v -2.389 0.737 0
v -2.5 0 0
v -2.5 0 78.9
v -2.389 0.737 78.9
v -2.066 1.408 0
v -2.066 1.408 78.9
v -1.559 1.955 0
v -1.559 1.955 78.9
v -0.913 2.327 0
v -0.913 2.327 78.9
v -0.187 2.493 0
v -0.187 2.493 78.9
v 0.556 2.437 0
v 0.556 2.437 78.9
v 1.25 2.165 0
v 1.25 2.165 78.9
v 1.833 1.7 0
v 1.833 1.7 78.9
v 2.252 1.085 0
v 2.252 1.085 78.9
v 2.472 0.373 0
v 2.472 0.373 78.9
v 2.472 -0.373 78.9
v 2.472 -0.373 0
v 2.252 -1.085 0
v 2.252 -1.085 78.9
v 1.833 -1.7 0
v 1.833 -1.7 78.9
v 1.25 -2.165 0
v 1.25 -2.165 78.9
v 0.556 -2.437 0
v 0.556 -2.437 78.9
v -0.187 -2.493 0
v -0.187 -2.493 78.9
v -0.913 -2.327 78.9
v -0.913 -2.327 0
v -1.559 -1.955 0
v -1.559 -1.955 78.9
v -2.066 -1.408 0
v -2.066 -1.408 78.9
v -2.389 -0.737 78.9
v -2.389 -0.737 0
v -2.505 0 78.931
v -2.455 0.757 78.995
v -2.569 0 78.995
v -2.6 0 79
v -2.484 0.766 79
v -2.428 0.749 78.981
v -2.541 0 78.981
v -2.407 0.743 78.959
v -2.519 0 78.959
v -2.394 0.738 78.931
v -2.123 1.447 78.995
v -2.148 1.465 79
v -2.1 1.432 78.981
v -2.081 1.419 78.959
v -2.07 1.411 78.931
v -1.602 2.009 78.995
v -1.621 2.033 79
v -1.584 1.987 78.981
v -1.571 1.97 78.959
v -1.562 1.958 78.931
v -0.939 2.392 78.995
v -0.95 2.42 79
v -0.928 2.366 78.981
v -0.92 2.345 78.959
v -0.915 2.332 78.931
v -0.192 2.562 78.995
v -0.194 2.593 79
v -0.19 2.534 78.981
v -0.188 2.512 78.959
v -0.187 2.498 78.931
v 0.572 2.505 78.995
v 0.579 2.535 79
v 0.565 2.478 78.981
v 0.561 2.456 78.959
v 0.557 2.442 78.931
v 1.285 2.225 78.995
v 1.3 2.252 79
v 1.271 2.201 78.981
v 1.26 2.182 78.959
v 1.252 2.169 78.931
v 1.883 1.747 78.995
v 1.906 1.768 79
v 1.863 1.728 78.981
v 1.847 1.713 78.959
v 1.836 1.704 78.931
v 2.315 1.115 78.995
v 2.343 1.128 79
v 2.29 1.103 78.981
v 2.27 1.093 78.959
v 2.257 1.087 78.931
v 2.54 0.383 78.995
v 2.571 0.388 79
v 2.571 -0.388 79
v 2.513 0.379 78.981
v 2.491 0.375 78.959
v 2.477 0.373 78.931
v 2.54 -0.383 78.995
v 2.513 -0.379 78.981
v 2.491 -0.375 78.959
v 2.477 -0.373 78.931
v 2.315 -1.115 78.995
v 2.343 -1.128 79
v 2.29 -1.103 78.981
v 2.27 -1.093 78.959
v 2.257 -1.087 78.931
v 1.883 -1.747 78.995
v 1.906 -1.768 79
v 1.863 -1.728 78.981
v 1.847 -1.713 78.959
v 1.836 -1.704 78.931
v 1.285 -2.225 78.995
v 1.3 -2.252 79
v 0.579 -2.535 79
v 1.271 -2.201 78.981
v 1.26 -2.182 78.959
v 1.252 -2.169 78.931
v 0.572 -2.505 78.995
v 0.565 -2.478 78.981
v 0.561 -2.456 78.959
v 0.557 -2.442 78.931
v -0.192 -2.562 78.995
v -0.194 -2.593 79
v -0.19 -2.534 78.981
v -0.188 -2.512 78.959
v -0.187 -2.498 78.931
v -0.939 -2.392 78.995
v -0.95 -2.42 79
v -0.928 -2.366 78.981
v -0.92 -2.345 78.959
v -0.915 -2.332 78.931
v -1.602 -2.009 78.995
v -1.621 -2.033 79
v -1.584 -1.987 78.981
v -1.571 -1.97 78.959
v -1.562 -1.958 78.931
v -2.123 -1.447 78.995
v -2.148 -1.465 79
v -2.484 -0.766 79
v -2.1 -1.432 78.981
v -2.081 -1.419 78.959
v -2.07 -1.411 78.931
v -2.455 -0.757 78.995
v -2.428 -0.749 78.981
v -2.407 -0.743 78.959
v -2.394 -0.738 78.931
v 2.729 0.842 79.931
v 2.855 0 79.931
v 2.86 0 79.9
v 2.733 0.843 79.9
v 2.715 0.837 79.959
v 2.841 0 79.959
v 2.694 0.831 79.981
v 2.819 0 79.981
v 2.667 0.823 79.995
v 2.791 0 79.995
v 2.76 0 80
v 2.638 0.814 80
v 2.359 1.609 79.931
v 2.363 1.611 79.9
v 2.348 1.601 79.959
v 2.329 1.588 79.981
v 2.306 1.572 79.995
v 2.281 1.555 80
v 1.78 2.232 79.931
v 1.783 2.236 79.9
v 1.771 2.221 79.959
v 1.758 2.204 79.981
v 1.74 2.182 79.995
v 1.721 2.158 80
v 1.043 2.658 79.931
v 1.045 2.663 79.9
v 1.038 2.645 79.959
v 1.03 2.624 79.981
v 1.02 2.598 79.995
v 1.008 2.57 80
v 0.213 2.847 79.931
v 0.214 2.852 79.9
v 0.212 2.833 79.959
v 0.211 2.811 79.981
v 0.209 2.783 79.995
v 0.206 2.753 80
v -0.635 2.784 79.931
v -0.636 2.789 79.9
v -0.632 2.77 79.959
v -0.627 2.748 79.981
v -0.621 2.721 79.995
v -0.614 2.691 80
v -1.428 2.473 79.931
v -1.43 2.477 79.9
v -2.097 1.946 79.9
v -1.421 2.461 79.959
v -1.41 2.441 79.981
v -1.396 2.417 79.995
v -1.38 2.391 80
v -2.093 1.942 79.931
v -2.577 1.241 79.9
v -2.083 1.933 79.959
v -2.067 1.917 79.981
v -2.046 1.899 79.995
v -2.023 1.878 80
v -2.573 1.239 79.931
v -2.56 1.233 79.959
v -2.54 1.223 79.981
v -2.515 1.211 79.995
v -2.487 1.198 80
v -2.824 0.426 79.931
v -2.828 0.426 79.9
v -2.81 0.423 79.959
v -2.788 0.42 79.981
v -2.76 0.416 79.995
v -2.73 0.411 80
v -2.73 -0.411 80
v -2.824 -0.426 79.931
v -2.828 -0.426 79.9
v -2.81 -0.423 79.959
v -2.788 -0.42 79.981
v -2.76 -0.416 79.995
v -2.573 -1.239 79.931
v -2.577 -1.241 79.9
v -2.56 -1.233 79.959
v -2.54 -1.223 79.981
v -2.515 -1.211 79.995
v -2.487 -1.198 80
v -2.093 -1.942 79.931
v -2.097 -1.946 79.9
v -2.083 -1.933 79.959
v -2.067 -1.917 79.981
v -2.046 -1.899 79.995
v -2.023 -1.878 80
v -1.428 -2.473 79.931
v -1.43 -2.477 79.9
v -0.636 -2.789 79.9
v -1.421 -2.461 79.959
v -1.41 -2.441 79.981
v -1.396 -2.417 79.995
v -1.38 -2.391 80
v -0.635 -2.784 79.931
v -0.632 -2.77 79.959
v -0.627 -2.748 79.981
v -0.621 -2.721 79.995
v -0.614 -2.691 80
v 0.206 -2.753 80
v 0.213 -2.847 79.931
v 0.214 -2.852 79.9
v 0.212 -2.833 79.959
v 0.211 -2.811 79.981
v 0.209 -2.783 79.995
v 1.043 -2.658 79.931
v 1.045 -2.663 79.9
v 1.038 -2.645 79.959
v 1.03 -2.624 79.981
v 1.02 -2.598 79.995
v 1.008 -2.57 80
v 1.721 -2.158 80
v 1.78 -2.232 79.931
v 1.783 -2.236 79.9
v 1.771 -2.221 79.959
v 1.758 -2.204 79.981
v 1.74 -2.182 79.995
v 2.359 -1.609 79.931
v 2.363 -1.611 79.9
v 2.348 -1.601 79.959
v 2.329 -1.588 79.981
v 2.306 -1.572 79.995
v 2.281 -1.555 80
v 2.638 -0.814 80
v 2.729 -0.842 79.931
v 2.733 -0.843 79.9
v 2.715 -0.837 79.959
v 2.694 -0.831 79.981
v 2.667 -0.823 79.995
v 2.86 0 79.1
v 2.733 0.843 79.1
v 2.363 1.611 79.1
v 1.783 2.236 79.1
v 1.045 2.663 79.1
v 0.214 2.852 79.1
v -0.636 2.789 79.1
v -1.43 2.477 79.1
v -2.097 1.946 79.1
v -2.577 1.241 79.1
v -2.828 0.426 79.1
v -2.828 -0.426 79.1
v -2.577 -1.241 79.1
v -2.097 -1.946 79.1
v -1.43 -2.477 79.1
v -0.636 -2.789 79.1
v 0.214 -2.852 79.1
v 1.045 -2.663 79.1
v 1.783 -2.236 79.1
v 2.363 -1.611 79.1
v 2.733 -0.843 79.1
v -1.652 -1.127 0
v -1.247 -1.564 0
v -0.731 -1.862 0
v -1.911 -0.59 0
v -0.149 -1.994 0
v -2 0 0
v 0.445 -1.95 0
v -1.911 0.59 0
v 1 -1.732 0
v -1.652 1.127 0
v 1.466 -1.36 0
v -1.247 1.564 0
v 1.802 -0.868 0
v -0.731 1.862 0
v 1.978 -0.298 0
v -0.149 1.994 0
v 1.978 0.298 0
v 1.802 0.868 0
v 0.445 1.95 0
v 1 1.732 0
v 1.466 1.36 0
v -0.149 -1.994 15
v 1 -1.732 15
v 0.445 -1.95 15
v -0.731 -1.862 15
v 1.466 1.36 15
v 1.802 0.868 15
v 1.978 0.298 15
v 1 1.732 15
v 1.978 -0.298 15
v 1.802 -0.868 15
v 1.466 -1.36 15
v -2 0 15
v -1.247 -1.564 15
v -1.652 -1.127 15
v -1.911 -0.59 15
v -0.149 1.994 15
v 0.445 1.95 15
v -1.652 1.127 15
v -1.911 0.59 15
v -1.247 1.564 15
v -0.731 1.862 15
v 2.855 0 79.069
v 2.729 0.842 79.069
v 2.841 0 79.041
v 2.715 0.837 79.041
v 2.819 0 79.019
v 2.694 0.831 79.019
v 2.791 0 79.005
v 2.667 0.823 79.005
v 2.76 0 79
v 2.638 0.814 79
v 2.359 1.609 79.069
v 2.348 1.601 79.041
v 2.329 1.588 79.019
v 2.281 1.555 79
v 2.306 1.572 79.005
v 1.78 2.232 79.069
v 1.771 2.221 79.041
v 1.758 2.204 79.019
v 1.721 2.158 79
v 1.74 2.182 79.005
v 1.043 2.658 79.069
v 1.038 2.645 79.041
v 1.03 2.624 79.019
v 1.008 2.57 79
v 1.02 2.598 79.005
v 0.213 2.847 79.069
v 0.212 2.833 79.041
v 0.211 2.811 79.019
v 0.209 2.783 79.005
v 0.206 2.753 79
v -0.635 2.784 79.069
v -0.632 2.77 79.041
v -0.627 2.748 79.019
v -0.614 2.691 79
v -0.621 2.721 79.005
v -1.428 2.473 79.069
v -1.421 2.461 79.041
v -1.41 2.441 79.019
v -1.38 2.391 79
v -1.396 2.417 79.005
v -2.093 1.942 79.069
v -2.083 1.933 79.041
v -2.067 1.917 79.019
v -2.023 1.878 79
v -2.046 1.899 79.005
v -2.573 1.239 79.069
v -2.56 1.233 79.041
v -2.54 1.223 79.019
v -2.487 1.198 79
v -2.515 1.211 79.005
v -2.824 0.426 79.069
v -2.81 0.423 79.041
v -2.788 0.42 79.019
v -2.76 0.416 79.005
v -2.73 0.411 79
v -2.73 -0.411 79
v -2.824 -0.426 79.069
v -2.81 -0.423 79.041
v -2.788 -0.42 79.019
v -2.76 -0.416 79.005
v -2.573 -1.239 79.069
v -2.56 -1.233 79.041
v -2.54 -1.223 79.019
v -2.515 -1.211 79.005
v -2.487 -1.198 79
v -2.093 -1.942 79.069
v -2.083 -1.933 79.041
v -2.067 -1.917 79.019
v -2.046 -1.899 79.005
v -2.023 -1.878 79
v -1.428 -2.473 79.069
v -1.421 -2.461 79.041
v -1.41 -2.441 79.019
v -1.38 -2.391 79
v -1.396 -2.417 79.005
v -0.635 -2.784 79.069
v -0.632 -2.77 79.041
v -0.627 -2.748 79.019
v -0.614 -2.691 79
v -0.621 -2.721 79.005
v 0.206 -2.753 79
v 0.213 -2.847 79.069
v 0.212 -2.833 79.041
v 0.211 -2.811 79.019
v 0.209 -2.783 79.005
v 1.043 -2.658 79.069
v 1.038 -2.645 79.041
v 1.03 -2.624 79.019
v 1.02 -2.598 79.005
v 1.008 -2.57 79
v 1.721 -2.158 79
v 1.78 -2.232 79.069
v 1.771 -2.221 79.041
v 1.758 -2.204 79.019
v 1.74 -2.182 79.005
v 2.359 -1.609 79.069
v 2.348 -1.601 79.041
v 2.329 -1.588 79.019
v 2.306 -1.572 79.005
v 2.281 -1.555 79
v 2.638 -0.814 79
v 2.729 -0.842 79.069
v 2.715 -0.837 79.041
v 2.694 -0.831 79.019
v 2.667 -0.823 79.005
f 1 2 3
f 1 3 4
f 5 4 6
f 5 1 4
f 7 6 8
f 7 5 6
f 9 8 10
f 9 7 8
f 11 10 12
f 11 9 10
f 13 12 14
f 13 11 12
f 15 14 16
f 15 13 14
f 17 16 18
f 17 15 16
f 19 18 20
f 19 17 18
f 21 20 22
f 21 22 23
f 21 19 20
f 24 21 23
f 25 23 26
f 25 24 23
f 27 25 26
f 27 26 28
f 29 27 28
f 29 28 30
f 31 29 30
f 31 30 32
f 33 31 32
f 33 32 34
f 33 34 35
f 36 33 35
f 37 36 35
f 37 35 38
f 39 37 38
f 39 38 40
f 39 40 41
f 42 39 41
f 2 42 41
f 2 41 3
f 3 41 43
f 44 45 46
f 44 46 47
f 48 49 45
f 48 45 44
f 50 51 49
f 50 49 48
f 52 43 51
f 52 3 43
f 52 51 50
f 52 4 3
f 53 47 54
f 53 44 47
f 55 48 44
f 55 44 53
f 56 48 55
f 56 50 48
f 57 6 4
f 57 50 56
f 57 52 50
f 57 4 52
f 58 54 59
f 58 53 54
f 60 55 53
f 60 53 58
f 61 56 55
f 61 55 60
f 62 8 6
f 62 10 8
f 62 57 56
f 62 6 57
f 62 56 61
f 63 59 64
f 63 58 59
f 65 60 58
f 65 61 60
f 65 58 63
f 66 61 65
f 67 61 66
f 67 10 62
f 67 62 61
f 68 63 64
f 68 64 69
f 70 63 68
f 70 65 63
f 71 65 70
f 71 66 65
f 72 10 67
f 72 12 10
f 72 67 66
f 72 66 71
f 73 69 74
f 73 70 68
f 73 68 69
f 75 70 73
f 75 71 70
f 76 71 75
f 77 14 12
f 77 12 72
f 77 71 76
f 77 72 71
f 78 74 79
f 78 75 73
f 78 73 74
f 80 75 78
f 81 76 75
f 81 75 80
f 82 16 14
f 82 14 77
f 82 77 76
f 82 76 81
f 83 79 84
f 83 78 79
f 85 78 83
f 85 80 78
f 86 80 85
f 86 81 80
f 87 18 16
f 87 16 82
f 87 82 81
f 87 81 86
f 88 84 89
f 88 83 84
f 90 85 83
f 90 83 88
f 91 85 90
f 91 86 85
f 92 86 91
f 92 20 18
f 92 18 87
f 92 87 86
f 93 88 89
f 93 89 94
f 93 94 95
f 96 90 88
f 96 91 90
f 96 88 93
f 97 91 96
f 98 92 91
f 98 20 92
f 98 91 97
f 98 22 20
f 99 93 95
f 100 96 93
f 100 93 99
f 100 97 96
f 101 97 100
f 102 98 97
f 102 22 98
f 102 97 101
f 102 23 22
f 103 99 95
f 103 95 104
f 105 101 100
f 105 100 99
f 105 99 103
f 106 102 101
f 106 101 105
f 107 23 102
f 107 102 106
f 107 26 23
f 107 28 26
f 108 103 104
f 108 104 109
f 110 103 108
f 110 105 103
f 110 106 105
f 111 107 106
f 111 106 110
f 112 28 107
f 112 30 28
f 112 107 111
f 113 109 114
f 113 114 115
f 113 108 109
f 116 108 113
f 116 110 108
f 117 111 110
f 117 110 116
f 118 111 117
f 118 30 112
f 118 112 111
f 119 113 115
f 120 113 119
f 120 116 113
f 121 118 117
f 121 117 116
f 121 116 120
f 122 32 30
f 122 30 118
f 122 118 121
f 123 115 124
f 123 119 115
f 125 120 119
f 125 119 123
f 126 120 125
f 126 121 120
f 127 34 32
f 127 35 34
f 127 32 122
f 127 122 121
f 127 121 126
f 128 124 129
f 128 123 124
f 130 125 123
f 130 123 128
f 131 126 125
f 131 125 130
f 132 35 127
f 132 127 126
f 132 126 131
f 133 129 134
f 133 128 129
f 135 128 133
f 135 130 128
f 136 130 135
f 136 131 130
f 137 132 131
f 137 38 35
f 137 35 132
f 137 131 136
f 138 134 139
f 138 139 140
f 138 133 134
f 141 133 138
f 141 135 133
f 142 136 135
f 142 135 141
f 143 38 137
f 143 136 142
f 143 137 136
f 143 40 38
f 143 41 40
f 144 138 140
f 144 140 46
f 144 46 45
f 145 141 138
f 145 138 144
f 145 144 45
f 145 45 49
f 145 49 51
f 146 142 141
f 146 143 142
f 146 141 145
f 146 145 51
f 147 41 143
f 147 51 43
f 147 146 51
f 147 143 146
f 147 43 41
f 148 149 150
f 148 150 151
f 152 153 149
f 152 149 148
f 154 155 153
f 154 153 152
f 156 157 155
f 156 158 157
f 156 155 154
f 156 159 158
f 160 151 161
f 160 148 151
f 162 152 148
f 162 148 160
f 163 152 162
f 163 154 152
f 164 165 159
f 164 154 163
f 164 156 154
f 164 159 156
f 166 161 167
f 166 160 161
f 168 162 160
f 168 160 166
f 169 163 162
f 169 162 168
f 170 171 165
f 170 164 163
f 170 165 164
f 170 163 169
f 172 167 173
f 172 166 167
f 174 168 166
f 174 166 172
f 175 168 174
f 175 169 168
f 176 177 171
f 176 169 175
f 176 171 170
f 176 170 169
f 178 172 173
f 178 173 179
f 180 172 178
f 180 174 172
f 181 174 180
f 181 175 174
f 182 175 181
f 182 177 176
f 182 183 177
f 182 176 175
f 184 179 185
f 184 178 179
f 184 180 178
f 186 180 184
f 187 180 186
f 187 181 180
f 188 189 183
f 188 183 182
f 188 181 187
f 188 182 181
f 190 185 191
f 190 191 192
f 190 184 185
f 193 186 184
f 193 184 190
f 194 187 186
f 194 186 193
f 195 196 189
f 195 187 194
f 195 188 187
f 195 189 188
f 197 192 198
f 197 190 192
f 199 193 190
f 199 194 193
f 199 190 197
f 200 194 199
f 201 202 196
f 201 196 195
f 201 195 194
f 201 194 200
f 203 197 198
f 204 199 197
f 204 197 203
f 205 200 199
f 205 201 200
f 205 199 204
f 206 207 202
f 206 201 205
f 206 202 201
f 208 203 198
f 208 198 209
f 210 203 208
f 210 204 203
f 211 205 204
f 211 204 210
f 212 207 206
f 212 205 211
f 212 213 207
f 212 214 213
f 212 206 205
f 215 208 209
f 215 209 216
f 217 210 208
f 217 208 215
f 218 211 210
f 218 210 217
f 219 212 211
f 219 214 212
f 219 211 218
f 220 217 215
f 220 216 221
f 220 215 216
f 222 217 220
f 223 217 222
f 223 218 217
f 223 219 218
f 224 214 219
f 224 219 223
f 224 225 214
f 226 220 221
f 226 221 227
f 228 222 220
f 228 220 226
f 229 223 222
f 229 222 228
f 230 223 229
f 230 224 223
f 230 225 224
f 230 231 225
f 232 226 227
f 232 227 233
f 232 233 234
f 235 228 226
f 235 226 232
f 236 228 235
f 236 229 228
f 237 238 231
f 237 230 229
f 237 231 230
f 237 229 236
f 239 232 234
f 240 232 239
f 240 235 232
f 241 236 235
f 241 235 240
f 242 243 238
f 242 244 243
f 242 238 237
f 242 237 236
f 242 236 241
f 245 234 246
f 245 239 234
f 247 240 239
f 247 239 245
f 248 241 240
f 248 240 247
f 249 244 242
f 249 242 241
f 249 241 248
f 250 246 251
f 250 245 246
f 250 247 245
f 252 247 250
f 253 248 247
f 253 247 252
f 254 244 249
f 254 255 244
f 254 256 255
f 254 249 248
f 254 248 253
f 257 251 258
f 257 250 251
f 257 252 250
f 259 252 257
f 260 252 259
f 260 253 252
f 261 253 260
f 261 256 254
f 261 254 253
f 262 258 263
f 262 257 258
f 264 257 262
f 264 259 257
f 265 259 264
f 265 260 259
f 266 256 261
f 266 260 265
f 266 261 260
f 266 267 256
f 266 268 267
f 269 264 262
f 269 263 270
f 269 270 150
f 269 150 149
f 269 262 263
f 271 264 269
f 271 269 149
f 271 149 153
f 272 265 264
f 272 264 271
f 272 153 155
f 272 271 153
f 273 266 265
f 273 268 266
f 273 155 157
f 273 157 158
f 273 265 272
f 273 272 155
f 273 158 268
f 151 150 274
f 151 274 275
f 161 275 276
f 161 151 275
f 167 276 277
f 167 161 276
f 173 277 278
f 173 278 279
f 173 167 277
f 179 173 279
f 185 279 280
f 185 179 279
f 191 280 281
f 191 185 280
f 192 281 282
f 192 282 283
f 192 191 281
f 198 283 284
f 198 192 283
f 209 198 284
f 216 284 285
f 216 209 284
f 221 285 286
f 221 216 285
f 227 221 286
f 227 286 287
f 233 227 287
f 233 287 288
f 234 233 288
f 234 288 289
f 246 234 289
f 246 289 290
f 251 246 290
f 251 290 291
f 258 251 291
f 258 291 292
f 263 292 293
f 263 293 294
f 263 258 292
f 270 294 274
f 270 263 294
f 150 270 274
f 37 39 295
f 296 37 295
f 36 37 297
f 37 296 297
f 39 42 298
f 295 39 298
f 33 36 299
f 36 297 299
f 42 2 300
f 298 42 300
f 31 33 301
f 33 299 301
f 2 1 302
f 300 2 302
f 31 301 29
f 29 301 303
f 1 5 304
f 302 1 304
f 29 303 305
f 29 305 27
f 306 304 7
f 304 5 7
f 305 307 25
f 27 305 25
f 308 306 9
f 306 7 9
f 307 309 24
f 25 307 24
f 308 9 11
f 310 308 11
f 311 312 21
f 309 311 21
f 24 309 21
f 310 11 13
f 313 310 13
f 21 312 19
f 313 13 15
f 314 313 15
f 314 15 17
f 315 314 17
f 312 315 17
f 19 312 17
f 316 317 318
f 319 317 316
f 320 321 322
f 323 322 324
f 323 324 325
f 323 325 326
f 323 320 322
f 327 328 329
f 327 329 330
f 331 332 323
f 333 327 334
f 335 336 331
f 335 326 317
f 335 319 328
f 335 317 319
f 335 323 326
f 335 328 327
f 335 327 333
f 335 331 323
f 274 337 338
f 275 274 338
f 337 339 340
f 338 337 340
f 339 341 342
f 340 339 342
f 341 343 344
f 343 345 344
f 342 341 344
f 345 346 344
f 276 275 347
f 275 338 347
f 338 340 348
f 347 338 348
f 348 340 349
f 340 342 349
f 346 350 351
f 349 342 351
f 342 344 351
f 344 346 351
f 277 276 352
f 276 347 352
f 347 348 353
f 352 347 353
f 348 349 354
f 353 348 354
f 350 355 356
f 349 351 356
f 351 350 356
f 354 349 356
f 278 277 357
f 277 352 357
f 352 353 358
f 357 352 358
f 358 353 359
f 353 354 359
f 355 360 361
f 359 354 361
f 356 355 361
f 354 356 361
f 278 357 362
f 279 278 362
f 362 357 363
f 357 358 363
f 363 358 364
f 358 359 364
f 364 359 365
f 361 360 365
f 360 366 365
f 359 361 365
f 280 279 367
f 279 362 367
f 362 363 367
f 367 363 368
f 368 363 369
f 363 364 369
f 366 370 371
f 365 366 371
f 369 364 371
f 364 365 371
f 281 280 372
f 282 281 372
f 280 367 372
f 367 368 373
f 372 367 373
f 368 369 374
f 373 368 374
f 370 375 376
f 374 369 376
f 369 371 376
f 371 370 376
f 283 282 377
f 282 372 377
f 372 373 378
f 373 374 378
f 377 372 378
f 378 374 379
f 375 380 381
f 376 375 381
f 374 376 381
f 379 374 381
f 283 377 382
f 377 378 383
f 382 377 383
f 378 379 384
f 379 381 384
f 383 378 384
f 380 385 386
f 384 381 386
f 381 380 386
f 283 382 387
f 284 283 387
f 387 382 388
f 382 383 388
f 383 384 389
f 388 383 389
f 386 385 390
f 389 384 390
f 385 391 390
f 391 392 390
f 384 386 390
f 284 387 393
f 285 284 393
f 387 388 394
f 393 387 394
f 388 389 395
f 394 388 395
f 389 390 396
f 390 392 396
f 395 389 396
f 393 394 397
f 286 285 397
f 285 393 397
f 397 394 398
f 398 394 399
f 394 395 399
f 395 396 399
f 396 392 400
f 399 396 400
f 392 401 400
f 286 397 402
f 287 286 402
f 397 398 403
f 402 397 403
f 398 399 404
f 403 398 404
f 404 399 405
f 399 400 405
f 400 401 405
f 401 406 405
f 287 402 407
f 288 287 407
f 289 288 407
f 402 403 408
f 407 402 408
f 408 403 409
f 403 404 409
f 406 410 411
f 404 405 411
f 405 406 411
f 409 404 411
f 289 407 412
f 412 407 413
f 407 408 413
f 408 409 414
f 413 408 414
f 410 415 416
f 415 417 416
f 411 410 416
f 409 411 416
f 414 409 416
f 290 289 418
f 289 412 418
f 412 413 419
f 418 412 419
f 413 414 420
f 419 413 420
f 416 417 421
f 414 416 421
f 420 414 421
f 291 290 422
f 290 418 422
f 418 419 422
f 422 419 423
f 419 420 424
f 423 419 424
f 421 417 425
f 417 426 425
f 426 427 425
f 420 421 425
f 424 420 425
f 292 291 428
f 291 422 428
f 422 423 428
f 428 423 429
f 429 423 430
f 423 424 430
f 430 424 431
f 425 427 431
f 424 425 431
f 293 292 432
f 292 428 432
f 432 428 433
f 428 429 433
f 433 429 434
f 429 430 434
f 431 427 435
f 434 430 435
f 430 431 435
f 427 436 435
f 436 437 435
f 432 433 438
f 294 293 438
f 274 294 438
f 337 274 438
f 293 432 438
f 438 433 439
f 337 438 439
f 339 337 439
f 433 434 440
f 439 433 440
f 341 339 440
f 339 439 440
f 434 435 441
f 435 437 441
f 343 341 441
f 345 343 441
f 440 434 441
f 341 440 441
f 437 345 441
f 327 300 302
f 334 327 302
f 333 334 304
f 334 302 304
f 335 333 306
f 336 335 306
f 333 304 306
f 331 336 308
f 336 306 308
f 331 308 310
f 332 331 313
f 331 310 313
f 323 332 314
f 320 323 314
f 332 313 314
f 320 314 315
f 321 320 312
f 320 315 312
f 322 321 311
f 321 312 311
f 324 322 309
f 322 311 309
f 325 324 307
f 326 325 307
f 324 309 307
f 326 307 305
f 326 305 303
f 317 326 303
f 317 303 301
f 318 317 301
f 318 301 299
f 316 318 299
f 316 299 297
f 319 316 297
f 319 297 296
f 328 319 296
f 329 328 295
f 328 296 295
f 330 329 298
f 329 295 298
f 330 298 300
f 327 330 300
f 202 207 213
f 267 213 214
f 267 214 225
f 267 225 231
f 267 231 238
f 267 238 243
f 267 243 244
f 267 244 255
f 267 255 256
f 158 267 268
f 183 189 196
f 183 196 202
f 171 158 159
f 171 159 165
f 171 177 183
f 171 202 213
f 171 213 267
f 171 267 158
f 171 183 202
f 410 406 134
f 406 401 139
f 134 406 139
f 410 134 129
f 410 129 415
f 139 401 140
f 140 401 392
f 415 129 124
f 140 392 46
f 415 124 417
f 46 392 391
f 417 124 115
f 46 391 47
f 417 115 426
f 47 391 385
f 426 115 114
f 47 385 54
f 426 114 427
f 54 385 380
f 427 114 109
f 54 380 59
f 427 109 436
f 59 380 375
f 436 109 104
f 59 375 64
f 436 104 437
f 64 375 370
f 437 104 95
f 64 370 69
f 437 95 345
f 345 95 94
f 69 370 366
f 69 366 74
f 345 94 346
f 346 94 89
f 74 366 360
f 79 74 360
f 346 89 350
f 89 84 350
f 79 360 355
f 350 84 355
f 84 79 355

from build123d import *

# Parameters (mm, degrees)
SKETCH1_R           = 9
BOSS_EXTRUDE1_DEPTH = 80
SKETCH2_R           = 2
CUT_EXTRUDE1_DEPTH  = 15
SKETCH3_R           = 9
SKETCH3_R_2         = 2.5
CUT_EXTRUDE3_DEPTH  = 112
SKETCH6_R           = 2.86034934
BOSS_EXTRUDE2_DEPTH = 1
FILLET1_R           = 0.1


with BuildPart() as part:
    # Sketch1 → Boss-Extrude1 (new body)
    with BuildSketch(Plane.XY):
        Circle(SKETCH1_R)
    extrude(amount=BOSS_EXTRUDE1_DEPTH)

    # Sketch2 → Cut-Extrude1 (cut)
    with BuildSketch(Plane(origin=(0, 0, 0), x_dir=(-1, 0, 0), z_dir=(0, 0, -1))):
        Circle(SKETCH2_R)
    extrude(amount=-CUT_EXTRUDE1_DEPTH, mode=Mode.SUBTRACT)

    # Sketch3 → Cut-Extrude3 (cut)
    with BuildSketch(Plane(origin=(0, 0, 0), x_dir=(-1, 0, 0), z_dir=(0, 0, -1))):
        Circle(SKETCH3_R)
        Circle(SKETCH3_R_2, mode=Mode.SUBTRACT)
    extrude(amount=-CUT_EXTRUDE3_DEPTH, mode=Mode.SUBTRACT)

    # Sketch6 → Boss-Extrude2 (add)
    with BuildSketch(Plane.XY.offset(80)):
        Circle(SKETCH6_R)
    extrude(amount=-BOSS_EXTRUDE2_DEPTH)

    # Fillet1
    fillet1_edges = [part.edges().sort_by_distance(p)[0] for p in [
        (2.5, 0, 79),
        (-2.86034934, 0, 79),
        (-2.86034934, 0, 80),
    ]]
    fillet(fillet1_edges, radius=FILLET1_R)


solid = part.part
